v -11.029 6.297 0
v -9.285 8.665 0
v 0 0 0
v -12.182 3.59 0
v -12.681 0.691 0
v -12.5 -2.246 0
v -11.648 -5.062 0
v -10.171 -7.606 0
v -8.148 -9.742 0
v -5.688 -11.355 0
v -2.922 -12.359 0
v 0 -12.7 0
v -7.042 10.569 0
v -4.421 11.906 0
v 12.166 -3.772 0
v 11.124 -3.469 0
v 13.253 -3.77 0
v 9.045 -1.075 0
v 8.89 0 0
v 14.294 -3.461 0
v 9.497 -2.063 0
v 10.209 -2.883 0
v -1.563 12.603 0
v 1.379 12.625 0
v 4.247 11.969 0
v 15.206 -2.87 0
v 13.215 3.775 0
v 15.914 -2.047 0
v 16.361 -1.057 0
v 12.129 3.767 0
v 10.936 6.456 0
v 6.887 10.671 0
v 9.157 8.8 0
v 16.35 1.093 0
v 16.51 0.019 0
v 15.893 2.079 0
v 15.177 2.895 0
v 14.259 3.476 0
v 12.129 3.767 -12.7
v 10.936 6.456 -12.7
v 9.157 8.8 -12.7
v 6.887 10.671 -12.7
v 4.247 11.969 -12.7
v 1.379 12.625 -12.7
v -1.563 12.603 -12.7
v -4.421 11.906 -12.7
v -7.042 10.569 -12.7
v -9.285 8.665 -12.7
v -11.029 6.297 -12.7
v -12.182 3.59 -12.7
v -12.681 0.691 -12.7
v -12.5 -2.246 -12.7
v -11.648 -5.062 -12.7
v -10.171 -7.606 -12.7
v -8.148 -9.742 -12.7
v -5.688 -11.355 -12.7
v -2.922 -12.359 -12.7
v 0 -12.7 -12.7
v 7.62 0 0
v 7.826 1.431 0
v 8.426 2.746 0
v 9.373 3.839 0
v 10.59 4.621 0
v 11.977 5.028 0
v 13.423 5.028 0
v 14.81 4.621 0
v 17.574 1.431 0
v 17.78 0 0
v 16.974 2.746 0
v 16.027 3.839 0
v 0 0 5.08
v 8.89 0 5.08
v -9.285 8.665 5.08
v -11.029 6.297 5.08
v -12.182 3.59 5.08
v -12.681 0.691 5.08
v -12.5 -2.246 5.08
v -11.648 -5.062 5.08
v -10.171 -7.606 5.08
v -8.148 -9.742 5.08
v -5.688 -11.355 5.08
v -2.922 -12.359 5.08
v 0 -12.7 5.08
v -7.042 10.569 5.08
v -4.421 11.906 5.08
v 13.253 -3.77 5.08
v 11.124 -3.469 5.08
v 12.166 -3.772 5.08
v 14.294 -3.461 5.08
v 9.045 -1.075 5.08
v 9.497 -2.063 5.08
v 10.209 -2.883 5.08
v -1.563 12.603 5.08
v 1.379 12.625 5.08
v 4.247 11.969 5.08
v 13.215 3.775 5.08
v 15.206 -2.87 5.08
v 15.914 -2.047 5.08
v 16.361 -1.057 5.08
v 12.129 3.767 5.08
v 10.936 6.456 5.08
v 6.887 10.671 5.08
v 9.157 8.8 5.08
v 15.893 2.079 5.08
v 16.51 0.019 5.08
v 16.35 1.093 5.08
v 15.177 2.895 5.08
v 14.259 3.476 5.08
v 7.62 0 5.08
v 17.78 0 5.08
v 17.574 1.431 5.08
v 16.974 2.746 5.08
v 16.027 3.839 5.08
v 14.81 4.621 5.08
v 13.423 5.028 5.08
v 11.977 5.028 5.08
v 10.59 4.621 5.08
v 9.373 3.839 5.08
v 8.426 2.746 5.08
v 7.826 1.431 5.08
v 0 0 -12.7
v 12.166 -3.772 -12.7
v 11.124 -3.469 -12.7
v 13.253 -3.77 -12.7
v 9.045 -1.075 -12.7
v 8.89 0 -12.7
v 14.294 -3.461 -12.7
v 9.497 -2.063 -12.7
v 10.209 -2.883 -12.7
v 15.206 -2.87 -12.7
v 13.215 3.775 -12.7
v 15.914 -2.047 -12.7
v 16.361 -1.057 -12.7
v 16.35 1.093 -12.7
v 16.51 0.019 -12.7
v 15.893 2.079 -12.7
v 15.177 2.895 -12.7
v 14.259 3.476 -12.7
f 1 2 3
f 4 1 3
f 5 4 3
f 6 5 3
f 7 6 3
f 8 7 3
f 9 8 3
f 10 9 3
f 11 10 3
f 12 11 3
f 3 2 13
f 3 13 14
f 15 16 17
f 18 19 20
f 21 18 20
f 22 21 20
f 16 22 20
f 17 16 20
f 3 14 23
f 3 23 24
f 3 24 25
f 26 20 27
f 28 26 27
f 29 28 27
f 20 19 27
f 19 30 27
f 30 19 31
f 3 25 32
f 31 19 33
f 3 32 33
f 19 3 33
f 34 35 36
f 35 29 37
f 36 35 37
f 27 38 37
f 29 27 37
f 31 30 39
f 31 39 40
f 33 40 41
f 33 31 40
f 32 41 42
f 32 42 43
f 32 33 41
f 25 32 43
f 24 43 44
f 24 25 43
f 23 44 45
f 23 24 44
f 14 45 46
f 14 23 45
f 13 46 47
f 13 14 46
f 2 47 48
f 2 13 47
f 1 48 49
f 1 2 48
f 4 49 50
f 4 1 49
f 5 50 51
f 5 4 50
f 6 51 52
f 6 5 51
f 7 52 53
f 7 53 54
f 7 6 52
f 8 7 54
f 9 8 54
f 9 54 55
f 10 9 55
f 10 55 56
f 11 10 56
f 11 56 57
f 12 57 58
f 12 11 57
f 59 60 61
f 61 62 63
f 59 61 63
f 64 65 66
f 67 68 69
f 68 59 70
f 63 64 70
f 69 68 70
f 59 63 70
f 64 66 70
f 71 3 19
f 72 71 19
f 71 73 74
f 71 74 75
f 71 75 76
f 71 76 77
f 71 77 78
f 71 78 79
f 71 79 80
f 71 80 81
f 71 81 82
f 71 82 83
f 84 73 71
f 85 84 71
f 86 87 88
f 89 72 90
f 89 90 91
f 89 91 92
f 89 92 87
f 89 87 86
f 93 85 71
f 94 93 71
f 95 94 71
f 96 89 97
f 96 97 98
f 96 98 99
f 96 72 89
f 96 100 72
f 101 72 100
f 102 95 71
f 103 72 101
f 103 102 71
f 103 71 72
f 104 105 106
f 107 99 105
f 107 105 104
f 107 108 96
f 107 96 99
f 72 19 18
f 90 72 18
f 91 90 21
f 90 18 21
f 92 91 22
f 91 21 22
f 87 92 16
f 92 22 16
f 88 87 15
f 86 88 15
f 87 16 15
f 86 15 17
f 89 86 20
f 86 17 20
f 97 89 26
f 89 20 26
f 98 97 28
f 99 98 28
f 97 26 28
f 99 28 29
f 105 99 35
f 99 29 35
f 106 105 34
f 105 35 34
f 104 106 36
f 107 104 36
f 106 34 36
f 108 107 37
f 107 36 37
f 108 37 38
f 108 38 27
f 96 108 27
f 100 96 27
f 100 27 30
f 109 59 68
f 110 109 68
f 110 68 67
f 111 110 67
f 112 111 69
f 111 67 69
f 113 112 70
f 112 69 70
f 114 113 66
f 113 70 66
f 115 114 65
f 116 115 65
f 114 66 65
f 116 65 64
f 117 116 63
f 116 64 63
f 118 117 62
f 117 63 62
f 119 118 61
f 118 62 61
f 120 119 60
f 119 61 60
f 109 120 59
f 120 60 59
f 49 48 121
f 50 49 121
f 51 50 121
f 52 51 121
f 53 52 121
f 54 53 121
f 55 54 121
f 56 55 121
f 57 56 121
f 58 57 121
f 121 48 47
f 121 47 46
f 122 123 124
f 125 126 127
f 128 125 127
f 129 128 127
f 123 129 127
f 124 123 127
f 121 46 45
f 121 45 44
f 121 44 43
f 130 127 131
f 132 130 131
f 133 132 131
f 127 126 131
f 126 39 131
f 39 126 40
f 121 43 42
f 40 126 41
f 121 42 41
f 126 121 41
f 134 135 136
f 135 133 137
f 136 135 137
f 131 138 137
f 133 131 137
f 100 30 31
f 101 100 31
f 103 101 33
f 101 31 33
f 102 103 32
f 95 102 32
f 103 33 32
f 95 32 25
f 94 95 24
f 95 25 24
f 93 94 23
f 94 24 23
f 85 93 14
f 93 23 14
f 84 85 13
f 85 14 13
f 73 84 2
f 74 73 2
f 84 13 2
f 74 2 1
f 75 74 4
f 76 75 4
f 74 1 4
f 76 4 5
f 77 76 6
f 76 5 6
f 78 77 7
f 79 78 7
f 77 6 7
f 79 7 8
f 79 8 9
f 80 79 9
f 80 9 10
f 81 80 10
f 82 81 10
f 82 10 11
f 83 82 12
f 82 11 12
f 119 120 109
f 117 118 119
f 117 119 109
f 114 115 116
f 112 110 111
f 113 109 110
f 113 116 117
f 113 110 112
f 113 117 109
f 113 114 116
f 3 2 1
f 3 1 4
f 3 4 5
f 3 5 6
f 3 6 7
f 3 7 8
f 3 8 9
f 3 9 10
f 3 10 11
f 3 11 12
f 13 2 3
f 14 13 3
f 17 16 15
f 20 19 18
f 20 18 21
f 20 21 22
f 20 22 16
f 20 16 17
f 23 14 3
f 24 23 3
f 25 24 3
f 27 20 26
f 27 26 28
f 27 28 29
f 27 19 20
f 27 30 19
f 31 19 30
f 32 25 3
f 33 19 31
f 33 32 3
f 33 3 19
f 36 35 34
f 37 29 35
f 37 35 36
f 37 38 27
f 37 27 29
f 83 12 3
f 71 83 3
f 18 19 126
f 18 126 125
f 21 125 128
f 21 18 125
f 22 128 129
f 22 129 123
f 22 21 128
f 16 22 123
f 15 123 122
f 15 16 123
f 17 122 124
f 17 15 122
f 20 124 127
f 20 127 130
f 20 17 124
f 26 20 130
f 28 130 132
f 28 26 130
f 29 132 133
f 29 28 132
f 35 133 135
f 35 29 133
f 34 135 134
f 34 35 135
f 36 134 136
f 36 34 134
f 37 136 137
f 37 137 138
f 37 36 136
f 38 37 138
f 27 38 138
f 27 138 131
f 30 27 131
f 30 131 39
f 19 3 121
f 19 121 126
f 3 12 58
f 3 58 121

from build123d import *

# Parameters (mm, degrees)
F1_DEPTH = 5.08
F2_DEPTH = 12.7
F4_DEPTH = 5.08


with BuildPart() as f1:
    # F0 (on Top) → F1 (new body)
    with BuildSketch(Plane.XY):
        with BuildLine():
            ThreePointArc((8.89, 0), (15.589076, -2.483816), (12.1285, 3.766894))
            ThreePointArc((12.1285, 3.766894), (-10.225692, 7.531615), (0, -12.7))
            Line((0, -12.7), (0, 0))
            Line((0, 0), (8.89, 0))
        make_face()
    extrude(amount=F1_DEPTH)


with BuildPart() as f2:
    # F0 (on Top) → F2 (new body)
    with BuildSketch(Plane.XY):
        with BuildLine():
            ThreePointArc((8.89, 0), (15.589076, -2.483816), (12.1285, 3.766894))
            ThreePointArc((12.1285, 3.766894), (-10.225692, 7.531615), (0, -12.7))
            Line((0, -12.7), (0, 0))
            Line((0, 0), (8.89, 0))
        make_face()
    extrude(amount=-F2_DEPTH)


with BuildPart() as f4:
    # F3 (on Top) → F4 (new body)
    with BuildSketch(Plane.XY):
        with BuildLine():
            Line((7.62, 0), (17.78, 0))
            ThreePointArc((17.78, 0), (12.7, 5.08), (7.62, 0))
        make_face()
    extrude(amount=F4_DEPTH)


solid = Compound([f1.part, f2.part, f4.part])
